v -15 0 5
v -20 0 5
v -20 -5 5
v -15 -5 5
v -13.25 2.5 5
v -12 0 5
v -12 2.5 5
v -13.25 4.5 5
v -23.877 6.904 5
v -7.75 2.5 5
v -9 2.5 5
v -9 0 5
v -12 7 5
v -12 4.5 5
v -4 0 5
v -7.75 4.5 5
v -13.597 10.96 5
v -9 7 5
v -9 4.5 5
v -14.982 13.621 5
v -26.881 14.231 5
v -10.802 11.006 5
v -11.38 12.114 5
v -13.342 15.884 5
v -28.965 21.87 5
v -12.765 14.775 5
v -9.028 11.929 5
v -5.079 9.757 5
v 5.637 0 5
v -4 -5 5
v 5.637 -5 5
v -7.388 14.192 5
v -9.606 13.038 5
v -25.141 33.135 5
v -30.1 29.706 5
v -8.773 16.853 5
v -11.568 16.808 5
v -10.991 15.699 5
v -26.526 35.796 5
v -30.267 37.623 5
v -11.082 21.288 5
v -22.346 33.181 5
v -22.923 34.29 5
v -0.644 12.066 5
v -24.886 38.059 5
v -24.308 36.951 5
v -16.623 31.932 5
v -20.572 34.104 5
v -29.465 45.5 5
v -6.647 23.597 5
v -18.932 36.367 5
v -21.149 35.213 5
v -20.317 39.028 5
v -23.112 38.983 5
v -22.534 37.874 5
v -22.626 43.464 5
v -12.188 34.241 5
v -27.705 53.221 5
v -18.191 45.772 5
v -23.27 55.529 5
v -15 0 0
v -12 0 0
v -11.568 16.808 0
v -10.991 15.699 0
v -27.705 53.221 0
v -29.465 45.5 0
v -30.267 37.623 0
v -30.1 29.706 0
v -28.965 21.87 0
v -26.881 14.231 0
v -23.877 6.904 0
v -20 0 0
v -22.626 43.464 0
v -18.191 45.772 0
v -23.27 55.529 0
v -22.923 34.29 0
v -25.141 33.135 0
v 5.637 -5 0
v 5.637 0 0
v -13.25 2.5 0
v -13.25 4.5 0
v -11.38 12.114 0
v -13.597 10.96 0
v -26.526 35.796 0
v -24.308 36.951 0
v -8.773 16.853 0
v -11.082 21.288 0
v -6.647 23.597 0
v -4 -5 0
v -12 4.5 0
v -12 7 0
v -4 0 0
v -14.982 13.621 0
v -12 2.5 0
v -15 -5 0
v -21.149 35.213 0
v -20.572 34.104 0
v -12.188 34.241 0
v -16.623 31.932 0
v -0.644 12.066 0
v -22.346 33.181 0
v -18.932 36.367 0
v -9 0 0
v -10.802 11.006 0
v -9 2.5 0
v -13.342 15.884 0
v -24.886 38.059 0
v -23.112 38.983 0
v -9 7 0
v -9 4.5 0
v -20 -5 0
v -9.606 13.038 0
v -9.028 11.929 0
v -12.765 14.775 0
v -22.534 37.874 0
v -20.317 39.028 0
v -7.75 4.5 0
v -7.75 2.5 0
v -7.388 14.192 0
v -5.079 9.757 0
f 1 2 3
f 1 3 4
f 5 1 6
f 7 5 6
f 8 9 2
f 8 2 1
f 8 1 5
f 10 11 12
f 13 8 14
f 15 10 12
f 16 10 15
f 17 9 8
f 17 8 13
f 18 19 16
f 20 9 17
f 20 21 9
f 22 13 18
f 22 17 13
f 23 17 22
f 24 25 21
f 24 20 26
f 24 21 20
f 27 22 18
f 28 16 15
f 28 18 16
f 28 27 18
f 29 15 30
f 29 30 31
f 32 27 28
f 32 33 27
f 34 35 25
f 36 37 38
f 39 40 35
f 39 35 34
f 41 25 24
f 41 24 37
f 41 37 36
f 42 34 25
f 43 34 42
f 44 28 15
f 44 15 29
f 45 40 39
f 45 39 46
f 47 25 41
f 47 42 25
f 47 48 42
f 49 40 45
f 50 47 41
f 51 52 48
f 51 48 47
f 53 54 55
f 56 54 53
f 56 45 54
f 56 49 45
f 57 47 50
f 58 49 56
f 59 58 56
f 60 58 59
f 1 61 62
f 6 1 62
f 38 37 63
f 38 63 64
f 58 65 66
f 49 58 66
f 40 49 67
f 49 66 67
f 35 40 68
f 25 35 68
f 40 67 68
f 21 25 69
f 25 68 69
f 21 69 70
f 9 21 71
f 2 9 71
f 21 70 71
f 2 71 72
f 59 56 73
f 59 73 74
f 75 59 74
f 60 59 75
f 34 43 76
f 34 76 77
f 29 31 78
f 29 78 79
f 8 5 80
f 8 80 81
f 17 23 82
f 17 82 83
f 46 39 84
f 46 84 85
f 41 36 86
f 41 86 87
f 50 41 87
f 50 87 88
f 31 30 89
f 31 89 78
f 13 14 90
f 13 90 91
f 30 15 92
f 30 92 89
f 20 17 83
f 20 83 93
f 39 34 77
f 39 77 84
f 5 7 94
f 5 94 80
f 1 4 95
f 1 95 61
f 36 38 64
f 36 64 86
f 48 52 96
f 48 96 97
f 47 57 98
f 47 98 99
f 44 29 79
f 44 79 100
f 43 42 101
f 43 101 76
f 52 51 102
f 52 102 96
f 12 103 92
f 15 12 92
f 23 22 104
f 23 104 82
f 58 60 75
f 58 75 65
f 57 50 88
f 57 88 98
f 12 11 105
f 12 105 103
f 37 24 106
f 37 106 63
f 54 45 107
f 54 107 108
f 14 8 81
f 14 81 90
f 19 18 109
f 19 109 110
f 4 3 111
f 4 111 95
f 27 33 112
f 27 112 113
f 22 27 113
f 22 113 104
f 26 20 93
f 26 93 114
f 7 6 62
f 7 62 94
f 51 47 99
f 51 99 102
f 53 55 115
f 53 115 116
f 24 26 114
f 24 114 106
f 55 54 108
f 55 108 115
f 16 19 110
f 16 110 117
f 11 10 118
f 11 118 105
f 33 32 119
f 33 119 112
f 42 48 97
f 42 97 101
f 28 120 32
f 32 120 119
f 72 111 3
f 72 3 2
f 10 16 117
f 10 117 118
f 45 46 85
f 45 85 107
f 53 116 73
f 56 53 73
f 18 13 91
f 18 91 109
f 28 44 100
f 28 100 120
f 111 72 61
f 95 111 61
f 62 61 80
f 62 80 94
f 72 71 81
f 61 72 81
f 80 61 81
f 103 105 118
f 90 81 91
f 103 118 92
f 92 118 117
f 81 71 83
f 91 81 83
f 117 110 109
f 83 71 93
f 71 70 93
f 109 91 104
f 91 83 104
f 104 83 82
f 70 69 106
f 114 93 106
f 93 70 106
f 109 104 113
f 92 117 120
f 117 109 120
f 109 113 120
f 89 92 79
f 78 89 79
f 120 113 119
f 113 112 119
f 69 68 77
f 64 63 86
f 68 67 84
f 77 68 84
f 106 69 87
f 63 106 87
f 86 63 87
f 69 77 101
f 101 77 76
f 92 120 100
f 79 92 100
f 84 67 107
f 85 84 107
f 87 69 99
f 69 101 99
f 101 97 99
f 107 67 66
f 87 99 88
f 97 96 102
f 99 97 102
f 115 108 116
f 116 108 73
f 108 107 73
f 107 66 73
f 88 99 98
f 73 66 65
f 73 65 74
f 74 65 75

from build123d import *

# Parameters (mm, degrees)
BOSS_EXTRUDE1_DEPTH = 5
SKETCH2_OUTSIDE_W   = 44.609
SKETCH2_OUTSIDE_H   = 67.511
CUT_EXTRUDE1_DEPTH  = 5
SKETCH3_W           = 5
SKETCH3_H           = 5
BOSS_EXTRUDE2_DEPTH = 5


with BuildPart() as part:
    # Sketch1 → Boss-Extrude1 (new body)
    with BuildSketch(Plane.XY):
        with BuildLine():
            Line((-20, 0), (0, 0))
            Line((0, 0), (-27.704916794, 53.220649991))
            ThreePointArc((-27.704916794, 53.220649991), (-29.652591379, 25.770621947), (-20, 0))
        make_face()
    extrude(amount=BOSS_EXTRUDE1_DEPTH)

    # Sketch2 outside → Cut-Extrude1 (cut)
    with BuildSketch(Plane.XY.offset(5)):
        with Locations((-15.1595, 26.6105)):
            Rectangle(SKETCH2_OUTSIDE_W, SKETCH2_OUTSIDE_H)
        with BuildLine():
            Line((-12, 4.5), (-12, 7))
            Line((-12, 7), (-9, 7))
            Line((-9, 7), (-9, 4.5))
            Line((-9, 4.5), (-7.75, 4.5))
            Line((-7.75, 4.5), (-7.75, 2.5))
            Line((-7.75, 2.5), (-9, 2.5))
            Line((-9, 2.5), (-9, 0))
            Line((-9, 0), (0, 0))
            Line((0, 0), (-7.387977812, 14.192173331))
            Line((-7.387977812, 14.192173331), (-9.605504895, 13.037801798))
            Line((-9.605504895, 13.037801798), (-9.028319128, 11.929038256))
            Line((-9.028319128, 11.929038256), (-10.802340795, 11.00554103))
            Line((-10.802340795, 11.00554103), (-11.379526561, 12.114304571))
            Line((-11.379526561, 12.114304571), (-13.597053644, 10.959933038))
            Line((-13.597053644, 10.959933038), (-14.982299484, 13.620965538))
            Line((-14.982299484, 13.620965538), (-12.764772401, 14.775337071))
            Line((-12.764772401, 14.775337071), (-13.341958167, 15.884100612))
            Line((-13.341958167, 15.884100612), (-11.567936501, 16.807597839))
            Line((-11.567936501, 16.807597839), (-10.990750734, 15.698834297))
            Line((-10.990750734, 15.698834297), (-8.773223651, 16.85320583))
            Line((-8.773223651, 16.85320583), (-18.931693143, 36.36744416))
            Line((-18.931693143, 36.36744416), (-21.149220226, 35.213072627))
            Line((-21.149220226, 35.213072627), (-20.572034459, 34.104309086))
            Line((-20.572034459, 34.104309086), (-22.346056125, 33.180811859))
            Line((-22.346056125, 33.180811859), (-22.923241892, 34.289575401))
            Line((-22.923241892, 34.289575401), (-25.140768975, 33.135203868))
            Line((-25.140768975, 33.135203868), (-26.526014815, 35.796236367))
            Line((-26.526014815, 35.796236367), (-24.308487732, 36.9506079))
            Line((-24.308487732, 36.9506079), (-24.885673498, 38.059371442))
            Line((-24.885673498, 38.059371442), (-23.111651832, 38.982868668))
            Line((-23.111651832, 38.982868668), (-22.534466065, 37.874105127))
            Line((-22.534466065, 37.874105127), (-20.316938982, 39.02847666))
            Line((-20.316938982, 39.02847666), (-27.704916794, 53.220649991))
            ThreePointArc((-27.704916794, 53.220649991), (-29.652591379, 25.770621947), (-20, 0))
            Line((-20, 0), (-12, 0))
            Line((-12, 0), (-12, 2.5))
            Line((-12, 2.5), (-13.25, 2.5))
            Line((-13.25, 2.5), (-13.25, 4.5))
            Line((-13.25, 4.5), (-12, 4.5))
        make_face(mode=Mode.SUBTRACT)
    extrude(amount=-CUT_EXTRUDE1_DEPTH, mode=Mode.SUBTRACT)

    # Sketch3 → Boss-Extrude2 (add)
    with BuildSketch(Plane.XY.offset(5)):
        Polygon((-23.269862628, 55.529393057), (-27.704916794, 53.220649991), (-22.625682049, 43.463530826), (-18.190627883, 45.772273892), align=None)
        Polygon((-12.187895911, 34.241133061), (-16.622950076, 31.932389994), (-11.081966718, 21.288259996), (-6.646912552, 23.597003062), align=None)
        Polygon((-5.079234746, 9.757119165), (0, 0), (-4, 0), (-4, -5), (5.636909734, -5), (5.636909734, 0), (-0.64418058, 12.065862231), align=None)
        with Locations((-17.5, -2.5)):
            Rectangle(SKETCH3_W, SKETCH3_H)
    extrude(amount=-BOSS_EXTRUDE2_DEPTH)


solid = part.part
